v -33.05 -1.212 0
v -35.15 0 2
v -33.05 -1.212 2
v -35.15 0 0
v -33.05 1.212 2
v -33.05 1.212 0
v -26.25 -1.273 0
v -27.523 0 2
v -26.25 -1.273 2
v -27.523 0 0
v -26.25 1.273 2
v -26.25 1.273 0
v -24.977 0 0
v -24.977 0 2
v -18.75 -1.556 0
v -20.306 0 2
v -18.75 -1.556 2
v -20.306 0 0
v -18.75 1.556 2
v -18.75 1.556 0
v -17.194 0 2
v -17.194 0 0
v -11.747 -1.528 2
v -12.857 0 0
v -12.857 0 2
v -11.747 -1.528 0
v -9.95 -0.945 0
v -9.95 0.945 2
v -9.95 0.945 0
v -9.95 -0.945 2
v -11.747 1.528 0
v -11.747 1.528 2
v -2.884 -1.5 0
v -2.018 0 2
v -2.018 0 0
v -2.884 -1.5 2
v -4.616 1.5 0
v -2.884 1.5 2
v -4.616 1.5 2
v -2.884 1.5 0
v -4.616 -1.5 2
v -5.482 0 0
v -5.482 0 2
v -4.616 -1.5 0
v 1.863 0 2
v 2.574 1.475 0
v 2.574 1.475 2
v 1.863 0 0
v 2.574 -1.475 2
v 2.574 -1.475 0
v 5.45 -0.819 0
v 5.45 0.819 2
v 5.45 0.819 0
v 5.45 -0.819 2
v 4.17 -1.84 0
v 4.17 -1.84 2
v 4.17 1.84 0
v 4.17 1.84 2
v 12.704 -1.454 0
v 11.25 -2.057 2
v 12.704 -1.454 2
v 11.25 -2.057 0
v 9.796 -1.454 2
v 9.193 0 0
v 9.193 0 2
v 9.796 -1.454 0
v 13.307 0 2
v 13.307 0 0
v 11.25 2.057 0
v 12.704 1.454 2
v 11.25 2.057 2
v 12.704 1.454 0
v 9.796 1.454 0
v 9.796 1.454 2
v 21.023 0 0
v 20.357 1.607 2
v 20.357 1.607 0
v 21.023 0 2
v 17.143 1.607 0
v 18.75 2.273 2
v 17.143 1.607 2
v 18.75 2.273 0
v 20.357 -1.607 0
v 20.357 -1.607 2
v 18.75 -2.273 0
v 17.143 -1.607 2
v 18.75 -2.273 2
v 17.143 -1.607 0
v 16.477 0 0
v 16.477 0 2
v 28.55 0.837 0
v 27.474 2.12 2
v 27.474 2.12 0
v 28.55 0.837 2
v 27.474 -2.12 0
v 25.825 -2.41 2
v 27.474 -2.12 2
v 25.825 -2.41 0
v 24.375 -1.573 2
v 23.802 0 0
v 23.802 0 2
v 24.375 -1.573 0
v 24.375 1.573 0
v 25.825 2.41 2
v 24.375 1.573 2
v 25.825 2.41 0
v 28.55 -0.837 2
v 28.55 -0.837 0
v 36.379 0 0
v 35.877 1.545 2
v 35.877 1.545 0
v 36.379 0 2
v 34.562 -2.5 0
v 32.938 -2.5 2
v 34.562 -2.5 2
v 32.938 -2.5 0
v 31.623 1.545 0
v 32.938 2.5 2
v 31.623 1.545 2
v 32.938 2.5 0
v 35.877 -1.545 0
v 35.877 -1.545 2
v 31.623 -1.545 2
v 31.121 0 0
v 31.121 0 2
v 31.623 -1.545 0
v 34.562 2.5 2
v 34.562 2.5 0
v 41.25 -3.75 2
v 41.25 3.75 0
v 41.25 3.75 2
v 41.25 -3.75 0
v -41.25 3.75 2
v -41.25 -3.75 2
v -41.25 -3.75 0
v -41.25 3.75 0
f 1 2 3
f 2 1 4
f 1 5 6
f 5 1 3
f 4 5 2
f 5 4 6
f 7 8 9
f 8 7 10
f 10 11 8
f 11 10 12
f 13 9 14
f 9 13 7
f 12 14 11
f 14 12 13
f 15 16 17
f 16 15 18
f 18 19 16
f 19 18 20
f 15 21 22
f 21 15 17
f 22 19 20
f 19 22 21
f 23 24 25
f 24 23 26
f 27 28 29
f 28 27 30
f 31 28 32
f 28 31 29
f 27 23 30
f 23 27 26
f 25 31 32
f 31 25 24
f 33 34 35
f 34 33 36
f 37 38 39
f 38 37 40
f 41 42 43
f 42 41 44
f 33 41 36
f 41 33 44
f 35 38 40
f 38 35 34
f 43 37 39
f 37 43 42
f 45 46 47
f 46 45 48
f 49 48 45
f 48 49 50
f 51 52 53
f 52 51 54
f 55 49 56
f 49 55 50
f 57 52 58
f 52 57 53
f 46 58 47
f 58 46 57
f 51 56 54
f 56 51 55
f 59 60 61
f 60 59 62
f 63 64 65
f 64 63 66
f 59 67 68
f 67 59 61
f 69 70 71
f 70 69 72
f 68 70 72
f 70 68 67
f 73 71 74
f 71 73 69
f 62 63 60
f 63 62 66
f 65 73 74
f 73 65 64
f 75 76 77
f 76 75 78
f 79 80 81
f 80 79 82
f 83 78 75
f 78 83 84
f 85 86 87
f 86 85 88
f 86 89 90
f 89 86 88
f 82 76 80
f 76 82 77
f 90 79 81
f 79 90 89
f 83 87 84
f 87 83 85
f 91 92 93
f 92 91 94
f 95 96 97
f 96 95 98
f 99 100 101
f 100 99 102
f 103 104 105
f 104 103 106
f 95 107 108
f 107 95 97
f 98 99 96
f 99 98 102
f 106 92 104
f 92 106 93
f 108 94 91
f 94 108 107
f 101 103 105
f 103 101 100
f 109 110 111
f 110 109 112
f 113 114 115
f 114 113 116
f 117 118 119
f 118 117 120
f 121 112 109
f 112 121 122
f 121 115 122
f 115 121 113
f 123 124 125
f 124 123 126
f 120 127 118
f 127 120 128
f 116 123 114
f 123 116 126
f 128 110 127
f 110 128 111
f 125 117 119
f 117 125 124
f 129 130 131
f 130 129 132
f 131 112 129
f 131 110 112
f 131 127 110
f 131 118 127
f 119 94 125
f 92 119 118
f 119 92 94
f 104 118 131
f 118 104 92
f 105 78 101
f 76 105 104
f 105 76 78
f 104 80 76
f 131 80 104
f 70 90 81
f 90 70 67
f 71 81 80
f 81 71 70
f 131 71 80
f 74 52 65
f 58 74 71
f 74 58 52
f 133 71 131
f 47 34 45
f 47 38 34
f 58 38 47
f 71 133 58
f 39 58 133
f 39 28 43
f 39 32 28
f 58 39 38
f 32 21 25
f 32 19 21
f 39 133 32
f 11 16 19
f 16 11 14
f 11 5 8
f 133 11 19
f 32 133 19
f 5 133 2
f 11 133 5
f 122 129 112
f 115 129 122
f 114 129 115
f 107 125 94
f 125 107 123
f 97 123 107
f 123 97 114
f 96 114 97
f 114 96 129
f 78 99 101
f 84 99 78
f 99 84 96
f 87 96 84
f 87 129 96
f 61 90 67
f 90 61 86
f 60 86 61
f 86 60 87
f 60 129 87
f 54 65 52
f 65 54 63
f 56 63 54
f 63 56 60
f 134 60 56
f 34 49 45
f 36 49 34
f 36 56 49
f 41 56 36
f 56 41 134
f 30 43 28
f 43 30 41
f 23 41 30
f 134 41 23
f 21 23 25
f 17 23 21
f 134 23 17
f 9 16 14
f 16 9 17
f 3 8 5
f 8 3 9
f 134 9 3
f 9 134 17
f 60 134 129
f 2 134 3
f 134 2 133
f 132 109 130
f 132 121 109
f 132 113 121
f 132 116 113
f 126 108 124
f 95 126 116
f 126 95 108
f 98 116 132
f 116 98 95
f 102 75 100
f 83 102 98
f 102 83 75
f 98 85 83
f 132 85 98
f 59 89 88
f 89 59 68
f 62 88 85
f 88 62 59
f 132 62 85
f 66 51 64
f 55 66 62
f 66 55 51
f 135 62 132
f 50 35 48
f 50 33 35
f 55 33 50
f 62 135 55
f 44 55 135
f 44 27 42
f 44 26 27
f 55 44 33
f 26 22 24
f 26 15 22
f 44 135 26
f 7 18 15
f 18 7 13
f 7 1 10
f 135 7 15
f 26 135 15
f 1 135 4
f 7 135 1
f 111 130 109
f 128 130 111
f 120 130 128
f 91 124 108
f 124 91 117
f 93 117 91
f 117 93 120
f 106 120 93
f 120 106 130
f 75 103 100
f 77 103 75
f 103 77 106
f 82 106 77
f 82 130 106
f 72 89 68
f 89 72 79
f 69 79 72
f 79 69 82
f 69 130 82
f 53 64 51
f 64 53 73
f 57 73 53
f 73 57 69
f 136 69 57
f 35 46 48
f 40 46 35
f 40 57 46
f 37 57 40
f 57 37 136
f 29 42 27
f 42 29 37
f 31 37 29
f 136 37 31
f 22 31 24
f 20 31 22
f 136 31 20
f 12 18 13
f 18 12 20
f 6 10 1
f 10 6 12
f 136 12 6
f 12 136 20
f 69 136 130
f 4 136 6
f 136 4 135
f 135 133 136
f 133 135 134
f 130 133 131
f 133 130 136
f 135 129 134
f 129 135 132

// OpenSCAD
// http://hydraraptor.blogspot.com/2011/02/polyholes.html
module polyhole(h, d) {
    n = max(round(2 * d),3);
    rotate([0,0,180])
        cylinder(h = h, r = (d / 2) / cos (180 / n), $fn = n);
}

minSize = 1;
maxSize = 5;
n = 10;
spacing = maxSize + 2.5;
thickness = 2;
translate([-spacing * (n + 1) / 2, 0, 0]) difference() {
    translate([0, -spacing / 2, 0]) cube([spacing * (n + 1), spacing, thickness]);
    for (i = [1:n]) {
        diam = (maxSize - minSize) / n * i + minSize;
        translate([i * spacing, 0, -1]) polyhole(d = diam, h = thickness + 2);
    }
}

//build platform for debug
color([0.5,0.5,0.5,0.1]) translate([-50,-50,-1.01]) %cube([100,100,1]);
